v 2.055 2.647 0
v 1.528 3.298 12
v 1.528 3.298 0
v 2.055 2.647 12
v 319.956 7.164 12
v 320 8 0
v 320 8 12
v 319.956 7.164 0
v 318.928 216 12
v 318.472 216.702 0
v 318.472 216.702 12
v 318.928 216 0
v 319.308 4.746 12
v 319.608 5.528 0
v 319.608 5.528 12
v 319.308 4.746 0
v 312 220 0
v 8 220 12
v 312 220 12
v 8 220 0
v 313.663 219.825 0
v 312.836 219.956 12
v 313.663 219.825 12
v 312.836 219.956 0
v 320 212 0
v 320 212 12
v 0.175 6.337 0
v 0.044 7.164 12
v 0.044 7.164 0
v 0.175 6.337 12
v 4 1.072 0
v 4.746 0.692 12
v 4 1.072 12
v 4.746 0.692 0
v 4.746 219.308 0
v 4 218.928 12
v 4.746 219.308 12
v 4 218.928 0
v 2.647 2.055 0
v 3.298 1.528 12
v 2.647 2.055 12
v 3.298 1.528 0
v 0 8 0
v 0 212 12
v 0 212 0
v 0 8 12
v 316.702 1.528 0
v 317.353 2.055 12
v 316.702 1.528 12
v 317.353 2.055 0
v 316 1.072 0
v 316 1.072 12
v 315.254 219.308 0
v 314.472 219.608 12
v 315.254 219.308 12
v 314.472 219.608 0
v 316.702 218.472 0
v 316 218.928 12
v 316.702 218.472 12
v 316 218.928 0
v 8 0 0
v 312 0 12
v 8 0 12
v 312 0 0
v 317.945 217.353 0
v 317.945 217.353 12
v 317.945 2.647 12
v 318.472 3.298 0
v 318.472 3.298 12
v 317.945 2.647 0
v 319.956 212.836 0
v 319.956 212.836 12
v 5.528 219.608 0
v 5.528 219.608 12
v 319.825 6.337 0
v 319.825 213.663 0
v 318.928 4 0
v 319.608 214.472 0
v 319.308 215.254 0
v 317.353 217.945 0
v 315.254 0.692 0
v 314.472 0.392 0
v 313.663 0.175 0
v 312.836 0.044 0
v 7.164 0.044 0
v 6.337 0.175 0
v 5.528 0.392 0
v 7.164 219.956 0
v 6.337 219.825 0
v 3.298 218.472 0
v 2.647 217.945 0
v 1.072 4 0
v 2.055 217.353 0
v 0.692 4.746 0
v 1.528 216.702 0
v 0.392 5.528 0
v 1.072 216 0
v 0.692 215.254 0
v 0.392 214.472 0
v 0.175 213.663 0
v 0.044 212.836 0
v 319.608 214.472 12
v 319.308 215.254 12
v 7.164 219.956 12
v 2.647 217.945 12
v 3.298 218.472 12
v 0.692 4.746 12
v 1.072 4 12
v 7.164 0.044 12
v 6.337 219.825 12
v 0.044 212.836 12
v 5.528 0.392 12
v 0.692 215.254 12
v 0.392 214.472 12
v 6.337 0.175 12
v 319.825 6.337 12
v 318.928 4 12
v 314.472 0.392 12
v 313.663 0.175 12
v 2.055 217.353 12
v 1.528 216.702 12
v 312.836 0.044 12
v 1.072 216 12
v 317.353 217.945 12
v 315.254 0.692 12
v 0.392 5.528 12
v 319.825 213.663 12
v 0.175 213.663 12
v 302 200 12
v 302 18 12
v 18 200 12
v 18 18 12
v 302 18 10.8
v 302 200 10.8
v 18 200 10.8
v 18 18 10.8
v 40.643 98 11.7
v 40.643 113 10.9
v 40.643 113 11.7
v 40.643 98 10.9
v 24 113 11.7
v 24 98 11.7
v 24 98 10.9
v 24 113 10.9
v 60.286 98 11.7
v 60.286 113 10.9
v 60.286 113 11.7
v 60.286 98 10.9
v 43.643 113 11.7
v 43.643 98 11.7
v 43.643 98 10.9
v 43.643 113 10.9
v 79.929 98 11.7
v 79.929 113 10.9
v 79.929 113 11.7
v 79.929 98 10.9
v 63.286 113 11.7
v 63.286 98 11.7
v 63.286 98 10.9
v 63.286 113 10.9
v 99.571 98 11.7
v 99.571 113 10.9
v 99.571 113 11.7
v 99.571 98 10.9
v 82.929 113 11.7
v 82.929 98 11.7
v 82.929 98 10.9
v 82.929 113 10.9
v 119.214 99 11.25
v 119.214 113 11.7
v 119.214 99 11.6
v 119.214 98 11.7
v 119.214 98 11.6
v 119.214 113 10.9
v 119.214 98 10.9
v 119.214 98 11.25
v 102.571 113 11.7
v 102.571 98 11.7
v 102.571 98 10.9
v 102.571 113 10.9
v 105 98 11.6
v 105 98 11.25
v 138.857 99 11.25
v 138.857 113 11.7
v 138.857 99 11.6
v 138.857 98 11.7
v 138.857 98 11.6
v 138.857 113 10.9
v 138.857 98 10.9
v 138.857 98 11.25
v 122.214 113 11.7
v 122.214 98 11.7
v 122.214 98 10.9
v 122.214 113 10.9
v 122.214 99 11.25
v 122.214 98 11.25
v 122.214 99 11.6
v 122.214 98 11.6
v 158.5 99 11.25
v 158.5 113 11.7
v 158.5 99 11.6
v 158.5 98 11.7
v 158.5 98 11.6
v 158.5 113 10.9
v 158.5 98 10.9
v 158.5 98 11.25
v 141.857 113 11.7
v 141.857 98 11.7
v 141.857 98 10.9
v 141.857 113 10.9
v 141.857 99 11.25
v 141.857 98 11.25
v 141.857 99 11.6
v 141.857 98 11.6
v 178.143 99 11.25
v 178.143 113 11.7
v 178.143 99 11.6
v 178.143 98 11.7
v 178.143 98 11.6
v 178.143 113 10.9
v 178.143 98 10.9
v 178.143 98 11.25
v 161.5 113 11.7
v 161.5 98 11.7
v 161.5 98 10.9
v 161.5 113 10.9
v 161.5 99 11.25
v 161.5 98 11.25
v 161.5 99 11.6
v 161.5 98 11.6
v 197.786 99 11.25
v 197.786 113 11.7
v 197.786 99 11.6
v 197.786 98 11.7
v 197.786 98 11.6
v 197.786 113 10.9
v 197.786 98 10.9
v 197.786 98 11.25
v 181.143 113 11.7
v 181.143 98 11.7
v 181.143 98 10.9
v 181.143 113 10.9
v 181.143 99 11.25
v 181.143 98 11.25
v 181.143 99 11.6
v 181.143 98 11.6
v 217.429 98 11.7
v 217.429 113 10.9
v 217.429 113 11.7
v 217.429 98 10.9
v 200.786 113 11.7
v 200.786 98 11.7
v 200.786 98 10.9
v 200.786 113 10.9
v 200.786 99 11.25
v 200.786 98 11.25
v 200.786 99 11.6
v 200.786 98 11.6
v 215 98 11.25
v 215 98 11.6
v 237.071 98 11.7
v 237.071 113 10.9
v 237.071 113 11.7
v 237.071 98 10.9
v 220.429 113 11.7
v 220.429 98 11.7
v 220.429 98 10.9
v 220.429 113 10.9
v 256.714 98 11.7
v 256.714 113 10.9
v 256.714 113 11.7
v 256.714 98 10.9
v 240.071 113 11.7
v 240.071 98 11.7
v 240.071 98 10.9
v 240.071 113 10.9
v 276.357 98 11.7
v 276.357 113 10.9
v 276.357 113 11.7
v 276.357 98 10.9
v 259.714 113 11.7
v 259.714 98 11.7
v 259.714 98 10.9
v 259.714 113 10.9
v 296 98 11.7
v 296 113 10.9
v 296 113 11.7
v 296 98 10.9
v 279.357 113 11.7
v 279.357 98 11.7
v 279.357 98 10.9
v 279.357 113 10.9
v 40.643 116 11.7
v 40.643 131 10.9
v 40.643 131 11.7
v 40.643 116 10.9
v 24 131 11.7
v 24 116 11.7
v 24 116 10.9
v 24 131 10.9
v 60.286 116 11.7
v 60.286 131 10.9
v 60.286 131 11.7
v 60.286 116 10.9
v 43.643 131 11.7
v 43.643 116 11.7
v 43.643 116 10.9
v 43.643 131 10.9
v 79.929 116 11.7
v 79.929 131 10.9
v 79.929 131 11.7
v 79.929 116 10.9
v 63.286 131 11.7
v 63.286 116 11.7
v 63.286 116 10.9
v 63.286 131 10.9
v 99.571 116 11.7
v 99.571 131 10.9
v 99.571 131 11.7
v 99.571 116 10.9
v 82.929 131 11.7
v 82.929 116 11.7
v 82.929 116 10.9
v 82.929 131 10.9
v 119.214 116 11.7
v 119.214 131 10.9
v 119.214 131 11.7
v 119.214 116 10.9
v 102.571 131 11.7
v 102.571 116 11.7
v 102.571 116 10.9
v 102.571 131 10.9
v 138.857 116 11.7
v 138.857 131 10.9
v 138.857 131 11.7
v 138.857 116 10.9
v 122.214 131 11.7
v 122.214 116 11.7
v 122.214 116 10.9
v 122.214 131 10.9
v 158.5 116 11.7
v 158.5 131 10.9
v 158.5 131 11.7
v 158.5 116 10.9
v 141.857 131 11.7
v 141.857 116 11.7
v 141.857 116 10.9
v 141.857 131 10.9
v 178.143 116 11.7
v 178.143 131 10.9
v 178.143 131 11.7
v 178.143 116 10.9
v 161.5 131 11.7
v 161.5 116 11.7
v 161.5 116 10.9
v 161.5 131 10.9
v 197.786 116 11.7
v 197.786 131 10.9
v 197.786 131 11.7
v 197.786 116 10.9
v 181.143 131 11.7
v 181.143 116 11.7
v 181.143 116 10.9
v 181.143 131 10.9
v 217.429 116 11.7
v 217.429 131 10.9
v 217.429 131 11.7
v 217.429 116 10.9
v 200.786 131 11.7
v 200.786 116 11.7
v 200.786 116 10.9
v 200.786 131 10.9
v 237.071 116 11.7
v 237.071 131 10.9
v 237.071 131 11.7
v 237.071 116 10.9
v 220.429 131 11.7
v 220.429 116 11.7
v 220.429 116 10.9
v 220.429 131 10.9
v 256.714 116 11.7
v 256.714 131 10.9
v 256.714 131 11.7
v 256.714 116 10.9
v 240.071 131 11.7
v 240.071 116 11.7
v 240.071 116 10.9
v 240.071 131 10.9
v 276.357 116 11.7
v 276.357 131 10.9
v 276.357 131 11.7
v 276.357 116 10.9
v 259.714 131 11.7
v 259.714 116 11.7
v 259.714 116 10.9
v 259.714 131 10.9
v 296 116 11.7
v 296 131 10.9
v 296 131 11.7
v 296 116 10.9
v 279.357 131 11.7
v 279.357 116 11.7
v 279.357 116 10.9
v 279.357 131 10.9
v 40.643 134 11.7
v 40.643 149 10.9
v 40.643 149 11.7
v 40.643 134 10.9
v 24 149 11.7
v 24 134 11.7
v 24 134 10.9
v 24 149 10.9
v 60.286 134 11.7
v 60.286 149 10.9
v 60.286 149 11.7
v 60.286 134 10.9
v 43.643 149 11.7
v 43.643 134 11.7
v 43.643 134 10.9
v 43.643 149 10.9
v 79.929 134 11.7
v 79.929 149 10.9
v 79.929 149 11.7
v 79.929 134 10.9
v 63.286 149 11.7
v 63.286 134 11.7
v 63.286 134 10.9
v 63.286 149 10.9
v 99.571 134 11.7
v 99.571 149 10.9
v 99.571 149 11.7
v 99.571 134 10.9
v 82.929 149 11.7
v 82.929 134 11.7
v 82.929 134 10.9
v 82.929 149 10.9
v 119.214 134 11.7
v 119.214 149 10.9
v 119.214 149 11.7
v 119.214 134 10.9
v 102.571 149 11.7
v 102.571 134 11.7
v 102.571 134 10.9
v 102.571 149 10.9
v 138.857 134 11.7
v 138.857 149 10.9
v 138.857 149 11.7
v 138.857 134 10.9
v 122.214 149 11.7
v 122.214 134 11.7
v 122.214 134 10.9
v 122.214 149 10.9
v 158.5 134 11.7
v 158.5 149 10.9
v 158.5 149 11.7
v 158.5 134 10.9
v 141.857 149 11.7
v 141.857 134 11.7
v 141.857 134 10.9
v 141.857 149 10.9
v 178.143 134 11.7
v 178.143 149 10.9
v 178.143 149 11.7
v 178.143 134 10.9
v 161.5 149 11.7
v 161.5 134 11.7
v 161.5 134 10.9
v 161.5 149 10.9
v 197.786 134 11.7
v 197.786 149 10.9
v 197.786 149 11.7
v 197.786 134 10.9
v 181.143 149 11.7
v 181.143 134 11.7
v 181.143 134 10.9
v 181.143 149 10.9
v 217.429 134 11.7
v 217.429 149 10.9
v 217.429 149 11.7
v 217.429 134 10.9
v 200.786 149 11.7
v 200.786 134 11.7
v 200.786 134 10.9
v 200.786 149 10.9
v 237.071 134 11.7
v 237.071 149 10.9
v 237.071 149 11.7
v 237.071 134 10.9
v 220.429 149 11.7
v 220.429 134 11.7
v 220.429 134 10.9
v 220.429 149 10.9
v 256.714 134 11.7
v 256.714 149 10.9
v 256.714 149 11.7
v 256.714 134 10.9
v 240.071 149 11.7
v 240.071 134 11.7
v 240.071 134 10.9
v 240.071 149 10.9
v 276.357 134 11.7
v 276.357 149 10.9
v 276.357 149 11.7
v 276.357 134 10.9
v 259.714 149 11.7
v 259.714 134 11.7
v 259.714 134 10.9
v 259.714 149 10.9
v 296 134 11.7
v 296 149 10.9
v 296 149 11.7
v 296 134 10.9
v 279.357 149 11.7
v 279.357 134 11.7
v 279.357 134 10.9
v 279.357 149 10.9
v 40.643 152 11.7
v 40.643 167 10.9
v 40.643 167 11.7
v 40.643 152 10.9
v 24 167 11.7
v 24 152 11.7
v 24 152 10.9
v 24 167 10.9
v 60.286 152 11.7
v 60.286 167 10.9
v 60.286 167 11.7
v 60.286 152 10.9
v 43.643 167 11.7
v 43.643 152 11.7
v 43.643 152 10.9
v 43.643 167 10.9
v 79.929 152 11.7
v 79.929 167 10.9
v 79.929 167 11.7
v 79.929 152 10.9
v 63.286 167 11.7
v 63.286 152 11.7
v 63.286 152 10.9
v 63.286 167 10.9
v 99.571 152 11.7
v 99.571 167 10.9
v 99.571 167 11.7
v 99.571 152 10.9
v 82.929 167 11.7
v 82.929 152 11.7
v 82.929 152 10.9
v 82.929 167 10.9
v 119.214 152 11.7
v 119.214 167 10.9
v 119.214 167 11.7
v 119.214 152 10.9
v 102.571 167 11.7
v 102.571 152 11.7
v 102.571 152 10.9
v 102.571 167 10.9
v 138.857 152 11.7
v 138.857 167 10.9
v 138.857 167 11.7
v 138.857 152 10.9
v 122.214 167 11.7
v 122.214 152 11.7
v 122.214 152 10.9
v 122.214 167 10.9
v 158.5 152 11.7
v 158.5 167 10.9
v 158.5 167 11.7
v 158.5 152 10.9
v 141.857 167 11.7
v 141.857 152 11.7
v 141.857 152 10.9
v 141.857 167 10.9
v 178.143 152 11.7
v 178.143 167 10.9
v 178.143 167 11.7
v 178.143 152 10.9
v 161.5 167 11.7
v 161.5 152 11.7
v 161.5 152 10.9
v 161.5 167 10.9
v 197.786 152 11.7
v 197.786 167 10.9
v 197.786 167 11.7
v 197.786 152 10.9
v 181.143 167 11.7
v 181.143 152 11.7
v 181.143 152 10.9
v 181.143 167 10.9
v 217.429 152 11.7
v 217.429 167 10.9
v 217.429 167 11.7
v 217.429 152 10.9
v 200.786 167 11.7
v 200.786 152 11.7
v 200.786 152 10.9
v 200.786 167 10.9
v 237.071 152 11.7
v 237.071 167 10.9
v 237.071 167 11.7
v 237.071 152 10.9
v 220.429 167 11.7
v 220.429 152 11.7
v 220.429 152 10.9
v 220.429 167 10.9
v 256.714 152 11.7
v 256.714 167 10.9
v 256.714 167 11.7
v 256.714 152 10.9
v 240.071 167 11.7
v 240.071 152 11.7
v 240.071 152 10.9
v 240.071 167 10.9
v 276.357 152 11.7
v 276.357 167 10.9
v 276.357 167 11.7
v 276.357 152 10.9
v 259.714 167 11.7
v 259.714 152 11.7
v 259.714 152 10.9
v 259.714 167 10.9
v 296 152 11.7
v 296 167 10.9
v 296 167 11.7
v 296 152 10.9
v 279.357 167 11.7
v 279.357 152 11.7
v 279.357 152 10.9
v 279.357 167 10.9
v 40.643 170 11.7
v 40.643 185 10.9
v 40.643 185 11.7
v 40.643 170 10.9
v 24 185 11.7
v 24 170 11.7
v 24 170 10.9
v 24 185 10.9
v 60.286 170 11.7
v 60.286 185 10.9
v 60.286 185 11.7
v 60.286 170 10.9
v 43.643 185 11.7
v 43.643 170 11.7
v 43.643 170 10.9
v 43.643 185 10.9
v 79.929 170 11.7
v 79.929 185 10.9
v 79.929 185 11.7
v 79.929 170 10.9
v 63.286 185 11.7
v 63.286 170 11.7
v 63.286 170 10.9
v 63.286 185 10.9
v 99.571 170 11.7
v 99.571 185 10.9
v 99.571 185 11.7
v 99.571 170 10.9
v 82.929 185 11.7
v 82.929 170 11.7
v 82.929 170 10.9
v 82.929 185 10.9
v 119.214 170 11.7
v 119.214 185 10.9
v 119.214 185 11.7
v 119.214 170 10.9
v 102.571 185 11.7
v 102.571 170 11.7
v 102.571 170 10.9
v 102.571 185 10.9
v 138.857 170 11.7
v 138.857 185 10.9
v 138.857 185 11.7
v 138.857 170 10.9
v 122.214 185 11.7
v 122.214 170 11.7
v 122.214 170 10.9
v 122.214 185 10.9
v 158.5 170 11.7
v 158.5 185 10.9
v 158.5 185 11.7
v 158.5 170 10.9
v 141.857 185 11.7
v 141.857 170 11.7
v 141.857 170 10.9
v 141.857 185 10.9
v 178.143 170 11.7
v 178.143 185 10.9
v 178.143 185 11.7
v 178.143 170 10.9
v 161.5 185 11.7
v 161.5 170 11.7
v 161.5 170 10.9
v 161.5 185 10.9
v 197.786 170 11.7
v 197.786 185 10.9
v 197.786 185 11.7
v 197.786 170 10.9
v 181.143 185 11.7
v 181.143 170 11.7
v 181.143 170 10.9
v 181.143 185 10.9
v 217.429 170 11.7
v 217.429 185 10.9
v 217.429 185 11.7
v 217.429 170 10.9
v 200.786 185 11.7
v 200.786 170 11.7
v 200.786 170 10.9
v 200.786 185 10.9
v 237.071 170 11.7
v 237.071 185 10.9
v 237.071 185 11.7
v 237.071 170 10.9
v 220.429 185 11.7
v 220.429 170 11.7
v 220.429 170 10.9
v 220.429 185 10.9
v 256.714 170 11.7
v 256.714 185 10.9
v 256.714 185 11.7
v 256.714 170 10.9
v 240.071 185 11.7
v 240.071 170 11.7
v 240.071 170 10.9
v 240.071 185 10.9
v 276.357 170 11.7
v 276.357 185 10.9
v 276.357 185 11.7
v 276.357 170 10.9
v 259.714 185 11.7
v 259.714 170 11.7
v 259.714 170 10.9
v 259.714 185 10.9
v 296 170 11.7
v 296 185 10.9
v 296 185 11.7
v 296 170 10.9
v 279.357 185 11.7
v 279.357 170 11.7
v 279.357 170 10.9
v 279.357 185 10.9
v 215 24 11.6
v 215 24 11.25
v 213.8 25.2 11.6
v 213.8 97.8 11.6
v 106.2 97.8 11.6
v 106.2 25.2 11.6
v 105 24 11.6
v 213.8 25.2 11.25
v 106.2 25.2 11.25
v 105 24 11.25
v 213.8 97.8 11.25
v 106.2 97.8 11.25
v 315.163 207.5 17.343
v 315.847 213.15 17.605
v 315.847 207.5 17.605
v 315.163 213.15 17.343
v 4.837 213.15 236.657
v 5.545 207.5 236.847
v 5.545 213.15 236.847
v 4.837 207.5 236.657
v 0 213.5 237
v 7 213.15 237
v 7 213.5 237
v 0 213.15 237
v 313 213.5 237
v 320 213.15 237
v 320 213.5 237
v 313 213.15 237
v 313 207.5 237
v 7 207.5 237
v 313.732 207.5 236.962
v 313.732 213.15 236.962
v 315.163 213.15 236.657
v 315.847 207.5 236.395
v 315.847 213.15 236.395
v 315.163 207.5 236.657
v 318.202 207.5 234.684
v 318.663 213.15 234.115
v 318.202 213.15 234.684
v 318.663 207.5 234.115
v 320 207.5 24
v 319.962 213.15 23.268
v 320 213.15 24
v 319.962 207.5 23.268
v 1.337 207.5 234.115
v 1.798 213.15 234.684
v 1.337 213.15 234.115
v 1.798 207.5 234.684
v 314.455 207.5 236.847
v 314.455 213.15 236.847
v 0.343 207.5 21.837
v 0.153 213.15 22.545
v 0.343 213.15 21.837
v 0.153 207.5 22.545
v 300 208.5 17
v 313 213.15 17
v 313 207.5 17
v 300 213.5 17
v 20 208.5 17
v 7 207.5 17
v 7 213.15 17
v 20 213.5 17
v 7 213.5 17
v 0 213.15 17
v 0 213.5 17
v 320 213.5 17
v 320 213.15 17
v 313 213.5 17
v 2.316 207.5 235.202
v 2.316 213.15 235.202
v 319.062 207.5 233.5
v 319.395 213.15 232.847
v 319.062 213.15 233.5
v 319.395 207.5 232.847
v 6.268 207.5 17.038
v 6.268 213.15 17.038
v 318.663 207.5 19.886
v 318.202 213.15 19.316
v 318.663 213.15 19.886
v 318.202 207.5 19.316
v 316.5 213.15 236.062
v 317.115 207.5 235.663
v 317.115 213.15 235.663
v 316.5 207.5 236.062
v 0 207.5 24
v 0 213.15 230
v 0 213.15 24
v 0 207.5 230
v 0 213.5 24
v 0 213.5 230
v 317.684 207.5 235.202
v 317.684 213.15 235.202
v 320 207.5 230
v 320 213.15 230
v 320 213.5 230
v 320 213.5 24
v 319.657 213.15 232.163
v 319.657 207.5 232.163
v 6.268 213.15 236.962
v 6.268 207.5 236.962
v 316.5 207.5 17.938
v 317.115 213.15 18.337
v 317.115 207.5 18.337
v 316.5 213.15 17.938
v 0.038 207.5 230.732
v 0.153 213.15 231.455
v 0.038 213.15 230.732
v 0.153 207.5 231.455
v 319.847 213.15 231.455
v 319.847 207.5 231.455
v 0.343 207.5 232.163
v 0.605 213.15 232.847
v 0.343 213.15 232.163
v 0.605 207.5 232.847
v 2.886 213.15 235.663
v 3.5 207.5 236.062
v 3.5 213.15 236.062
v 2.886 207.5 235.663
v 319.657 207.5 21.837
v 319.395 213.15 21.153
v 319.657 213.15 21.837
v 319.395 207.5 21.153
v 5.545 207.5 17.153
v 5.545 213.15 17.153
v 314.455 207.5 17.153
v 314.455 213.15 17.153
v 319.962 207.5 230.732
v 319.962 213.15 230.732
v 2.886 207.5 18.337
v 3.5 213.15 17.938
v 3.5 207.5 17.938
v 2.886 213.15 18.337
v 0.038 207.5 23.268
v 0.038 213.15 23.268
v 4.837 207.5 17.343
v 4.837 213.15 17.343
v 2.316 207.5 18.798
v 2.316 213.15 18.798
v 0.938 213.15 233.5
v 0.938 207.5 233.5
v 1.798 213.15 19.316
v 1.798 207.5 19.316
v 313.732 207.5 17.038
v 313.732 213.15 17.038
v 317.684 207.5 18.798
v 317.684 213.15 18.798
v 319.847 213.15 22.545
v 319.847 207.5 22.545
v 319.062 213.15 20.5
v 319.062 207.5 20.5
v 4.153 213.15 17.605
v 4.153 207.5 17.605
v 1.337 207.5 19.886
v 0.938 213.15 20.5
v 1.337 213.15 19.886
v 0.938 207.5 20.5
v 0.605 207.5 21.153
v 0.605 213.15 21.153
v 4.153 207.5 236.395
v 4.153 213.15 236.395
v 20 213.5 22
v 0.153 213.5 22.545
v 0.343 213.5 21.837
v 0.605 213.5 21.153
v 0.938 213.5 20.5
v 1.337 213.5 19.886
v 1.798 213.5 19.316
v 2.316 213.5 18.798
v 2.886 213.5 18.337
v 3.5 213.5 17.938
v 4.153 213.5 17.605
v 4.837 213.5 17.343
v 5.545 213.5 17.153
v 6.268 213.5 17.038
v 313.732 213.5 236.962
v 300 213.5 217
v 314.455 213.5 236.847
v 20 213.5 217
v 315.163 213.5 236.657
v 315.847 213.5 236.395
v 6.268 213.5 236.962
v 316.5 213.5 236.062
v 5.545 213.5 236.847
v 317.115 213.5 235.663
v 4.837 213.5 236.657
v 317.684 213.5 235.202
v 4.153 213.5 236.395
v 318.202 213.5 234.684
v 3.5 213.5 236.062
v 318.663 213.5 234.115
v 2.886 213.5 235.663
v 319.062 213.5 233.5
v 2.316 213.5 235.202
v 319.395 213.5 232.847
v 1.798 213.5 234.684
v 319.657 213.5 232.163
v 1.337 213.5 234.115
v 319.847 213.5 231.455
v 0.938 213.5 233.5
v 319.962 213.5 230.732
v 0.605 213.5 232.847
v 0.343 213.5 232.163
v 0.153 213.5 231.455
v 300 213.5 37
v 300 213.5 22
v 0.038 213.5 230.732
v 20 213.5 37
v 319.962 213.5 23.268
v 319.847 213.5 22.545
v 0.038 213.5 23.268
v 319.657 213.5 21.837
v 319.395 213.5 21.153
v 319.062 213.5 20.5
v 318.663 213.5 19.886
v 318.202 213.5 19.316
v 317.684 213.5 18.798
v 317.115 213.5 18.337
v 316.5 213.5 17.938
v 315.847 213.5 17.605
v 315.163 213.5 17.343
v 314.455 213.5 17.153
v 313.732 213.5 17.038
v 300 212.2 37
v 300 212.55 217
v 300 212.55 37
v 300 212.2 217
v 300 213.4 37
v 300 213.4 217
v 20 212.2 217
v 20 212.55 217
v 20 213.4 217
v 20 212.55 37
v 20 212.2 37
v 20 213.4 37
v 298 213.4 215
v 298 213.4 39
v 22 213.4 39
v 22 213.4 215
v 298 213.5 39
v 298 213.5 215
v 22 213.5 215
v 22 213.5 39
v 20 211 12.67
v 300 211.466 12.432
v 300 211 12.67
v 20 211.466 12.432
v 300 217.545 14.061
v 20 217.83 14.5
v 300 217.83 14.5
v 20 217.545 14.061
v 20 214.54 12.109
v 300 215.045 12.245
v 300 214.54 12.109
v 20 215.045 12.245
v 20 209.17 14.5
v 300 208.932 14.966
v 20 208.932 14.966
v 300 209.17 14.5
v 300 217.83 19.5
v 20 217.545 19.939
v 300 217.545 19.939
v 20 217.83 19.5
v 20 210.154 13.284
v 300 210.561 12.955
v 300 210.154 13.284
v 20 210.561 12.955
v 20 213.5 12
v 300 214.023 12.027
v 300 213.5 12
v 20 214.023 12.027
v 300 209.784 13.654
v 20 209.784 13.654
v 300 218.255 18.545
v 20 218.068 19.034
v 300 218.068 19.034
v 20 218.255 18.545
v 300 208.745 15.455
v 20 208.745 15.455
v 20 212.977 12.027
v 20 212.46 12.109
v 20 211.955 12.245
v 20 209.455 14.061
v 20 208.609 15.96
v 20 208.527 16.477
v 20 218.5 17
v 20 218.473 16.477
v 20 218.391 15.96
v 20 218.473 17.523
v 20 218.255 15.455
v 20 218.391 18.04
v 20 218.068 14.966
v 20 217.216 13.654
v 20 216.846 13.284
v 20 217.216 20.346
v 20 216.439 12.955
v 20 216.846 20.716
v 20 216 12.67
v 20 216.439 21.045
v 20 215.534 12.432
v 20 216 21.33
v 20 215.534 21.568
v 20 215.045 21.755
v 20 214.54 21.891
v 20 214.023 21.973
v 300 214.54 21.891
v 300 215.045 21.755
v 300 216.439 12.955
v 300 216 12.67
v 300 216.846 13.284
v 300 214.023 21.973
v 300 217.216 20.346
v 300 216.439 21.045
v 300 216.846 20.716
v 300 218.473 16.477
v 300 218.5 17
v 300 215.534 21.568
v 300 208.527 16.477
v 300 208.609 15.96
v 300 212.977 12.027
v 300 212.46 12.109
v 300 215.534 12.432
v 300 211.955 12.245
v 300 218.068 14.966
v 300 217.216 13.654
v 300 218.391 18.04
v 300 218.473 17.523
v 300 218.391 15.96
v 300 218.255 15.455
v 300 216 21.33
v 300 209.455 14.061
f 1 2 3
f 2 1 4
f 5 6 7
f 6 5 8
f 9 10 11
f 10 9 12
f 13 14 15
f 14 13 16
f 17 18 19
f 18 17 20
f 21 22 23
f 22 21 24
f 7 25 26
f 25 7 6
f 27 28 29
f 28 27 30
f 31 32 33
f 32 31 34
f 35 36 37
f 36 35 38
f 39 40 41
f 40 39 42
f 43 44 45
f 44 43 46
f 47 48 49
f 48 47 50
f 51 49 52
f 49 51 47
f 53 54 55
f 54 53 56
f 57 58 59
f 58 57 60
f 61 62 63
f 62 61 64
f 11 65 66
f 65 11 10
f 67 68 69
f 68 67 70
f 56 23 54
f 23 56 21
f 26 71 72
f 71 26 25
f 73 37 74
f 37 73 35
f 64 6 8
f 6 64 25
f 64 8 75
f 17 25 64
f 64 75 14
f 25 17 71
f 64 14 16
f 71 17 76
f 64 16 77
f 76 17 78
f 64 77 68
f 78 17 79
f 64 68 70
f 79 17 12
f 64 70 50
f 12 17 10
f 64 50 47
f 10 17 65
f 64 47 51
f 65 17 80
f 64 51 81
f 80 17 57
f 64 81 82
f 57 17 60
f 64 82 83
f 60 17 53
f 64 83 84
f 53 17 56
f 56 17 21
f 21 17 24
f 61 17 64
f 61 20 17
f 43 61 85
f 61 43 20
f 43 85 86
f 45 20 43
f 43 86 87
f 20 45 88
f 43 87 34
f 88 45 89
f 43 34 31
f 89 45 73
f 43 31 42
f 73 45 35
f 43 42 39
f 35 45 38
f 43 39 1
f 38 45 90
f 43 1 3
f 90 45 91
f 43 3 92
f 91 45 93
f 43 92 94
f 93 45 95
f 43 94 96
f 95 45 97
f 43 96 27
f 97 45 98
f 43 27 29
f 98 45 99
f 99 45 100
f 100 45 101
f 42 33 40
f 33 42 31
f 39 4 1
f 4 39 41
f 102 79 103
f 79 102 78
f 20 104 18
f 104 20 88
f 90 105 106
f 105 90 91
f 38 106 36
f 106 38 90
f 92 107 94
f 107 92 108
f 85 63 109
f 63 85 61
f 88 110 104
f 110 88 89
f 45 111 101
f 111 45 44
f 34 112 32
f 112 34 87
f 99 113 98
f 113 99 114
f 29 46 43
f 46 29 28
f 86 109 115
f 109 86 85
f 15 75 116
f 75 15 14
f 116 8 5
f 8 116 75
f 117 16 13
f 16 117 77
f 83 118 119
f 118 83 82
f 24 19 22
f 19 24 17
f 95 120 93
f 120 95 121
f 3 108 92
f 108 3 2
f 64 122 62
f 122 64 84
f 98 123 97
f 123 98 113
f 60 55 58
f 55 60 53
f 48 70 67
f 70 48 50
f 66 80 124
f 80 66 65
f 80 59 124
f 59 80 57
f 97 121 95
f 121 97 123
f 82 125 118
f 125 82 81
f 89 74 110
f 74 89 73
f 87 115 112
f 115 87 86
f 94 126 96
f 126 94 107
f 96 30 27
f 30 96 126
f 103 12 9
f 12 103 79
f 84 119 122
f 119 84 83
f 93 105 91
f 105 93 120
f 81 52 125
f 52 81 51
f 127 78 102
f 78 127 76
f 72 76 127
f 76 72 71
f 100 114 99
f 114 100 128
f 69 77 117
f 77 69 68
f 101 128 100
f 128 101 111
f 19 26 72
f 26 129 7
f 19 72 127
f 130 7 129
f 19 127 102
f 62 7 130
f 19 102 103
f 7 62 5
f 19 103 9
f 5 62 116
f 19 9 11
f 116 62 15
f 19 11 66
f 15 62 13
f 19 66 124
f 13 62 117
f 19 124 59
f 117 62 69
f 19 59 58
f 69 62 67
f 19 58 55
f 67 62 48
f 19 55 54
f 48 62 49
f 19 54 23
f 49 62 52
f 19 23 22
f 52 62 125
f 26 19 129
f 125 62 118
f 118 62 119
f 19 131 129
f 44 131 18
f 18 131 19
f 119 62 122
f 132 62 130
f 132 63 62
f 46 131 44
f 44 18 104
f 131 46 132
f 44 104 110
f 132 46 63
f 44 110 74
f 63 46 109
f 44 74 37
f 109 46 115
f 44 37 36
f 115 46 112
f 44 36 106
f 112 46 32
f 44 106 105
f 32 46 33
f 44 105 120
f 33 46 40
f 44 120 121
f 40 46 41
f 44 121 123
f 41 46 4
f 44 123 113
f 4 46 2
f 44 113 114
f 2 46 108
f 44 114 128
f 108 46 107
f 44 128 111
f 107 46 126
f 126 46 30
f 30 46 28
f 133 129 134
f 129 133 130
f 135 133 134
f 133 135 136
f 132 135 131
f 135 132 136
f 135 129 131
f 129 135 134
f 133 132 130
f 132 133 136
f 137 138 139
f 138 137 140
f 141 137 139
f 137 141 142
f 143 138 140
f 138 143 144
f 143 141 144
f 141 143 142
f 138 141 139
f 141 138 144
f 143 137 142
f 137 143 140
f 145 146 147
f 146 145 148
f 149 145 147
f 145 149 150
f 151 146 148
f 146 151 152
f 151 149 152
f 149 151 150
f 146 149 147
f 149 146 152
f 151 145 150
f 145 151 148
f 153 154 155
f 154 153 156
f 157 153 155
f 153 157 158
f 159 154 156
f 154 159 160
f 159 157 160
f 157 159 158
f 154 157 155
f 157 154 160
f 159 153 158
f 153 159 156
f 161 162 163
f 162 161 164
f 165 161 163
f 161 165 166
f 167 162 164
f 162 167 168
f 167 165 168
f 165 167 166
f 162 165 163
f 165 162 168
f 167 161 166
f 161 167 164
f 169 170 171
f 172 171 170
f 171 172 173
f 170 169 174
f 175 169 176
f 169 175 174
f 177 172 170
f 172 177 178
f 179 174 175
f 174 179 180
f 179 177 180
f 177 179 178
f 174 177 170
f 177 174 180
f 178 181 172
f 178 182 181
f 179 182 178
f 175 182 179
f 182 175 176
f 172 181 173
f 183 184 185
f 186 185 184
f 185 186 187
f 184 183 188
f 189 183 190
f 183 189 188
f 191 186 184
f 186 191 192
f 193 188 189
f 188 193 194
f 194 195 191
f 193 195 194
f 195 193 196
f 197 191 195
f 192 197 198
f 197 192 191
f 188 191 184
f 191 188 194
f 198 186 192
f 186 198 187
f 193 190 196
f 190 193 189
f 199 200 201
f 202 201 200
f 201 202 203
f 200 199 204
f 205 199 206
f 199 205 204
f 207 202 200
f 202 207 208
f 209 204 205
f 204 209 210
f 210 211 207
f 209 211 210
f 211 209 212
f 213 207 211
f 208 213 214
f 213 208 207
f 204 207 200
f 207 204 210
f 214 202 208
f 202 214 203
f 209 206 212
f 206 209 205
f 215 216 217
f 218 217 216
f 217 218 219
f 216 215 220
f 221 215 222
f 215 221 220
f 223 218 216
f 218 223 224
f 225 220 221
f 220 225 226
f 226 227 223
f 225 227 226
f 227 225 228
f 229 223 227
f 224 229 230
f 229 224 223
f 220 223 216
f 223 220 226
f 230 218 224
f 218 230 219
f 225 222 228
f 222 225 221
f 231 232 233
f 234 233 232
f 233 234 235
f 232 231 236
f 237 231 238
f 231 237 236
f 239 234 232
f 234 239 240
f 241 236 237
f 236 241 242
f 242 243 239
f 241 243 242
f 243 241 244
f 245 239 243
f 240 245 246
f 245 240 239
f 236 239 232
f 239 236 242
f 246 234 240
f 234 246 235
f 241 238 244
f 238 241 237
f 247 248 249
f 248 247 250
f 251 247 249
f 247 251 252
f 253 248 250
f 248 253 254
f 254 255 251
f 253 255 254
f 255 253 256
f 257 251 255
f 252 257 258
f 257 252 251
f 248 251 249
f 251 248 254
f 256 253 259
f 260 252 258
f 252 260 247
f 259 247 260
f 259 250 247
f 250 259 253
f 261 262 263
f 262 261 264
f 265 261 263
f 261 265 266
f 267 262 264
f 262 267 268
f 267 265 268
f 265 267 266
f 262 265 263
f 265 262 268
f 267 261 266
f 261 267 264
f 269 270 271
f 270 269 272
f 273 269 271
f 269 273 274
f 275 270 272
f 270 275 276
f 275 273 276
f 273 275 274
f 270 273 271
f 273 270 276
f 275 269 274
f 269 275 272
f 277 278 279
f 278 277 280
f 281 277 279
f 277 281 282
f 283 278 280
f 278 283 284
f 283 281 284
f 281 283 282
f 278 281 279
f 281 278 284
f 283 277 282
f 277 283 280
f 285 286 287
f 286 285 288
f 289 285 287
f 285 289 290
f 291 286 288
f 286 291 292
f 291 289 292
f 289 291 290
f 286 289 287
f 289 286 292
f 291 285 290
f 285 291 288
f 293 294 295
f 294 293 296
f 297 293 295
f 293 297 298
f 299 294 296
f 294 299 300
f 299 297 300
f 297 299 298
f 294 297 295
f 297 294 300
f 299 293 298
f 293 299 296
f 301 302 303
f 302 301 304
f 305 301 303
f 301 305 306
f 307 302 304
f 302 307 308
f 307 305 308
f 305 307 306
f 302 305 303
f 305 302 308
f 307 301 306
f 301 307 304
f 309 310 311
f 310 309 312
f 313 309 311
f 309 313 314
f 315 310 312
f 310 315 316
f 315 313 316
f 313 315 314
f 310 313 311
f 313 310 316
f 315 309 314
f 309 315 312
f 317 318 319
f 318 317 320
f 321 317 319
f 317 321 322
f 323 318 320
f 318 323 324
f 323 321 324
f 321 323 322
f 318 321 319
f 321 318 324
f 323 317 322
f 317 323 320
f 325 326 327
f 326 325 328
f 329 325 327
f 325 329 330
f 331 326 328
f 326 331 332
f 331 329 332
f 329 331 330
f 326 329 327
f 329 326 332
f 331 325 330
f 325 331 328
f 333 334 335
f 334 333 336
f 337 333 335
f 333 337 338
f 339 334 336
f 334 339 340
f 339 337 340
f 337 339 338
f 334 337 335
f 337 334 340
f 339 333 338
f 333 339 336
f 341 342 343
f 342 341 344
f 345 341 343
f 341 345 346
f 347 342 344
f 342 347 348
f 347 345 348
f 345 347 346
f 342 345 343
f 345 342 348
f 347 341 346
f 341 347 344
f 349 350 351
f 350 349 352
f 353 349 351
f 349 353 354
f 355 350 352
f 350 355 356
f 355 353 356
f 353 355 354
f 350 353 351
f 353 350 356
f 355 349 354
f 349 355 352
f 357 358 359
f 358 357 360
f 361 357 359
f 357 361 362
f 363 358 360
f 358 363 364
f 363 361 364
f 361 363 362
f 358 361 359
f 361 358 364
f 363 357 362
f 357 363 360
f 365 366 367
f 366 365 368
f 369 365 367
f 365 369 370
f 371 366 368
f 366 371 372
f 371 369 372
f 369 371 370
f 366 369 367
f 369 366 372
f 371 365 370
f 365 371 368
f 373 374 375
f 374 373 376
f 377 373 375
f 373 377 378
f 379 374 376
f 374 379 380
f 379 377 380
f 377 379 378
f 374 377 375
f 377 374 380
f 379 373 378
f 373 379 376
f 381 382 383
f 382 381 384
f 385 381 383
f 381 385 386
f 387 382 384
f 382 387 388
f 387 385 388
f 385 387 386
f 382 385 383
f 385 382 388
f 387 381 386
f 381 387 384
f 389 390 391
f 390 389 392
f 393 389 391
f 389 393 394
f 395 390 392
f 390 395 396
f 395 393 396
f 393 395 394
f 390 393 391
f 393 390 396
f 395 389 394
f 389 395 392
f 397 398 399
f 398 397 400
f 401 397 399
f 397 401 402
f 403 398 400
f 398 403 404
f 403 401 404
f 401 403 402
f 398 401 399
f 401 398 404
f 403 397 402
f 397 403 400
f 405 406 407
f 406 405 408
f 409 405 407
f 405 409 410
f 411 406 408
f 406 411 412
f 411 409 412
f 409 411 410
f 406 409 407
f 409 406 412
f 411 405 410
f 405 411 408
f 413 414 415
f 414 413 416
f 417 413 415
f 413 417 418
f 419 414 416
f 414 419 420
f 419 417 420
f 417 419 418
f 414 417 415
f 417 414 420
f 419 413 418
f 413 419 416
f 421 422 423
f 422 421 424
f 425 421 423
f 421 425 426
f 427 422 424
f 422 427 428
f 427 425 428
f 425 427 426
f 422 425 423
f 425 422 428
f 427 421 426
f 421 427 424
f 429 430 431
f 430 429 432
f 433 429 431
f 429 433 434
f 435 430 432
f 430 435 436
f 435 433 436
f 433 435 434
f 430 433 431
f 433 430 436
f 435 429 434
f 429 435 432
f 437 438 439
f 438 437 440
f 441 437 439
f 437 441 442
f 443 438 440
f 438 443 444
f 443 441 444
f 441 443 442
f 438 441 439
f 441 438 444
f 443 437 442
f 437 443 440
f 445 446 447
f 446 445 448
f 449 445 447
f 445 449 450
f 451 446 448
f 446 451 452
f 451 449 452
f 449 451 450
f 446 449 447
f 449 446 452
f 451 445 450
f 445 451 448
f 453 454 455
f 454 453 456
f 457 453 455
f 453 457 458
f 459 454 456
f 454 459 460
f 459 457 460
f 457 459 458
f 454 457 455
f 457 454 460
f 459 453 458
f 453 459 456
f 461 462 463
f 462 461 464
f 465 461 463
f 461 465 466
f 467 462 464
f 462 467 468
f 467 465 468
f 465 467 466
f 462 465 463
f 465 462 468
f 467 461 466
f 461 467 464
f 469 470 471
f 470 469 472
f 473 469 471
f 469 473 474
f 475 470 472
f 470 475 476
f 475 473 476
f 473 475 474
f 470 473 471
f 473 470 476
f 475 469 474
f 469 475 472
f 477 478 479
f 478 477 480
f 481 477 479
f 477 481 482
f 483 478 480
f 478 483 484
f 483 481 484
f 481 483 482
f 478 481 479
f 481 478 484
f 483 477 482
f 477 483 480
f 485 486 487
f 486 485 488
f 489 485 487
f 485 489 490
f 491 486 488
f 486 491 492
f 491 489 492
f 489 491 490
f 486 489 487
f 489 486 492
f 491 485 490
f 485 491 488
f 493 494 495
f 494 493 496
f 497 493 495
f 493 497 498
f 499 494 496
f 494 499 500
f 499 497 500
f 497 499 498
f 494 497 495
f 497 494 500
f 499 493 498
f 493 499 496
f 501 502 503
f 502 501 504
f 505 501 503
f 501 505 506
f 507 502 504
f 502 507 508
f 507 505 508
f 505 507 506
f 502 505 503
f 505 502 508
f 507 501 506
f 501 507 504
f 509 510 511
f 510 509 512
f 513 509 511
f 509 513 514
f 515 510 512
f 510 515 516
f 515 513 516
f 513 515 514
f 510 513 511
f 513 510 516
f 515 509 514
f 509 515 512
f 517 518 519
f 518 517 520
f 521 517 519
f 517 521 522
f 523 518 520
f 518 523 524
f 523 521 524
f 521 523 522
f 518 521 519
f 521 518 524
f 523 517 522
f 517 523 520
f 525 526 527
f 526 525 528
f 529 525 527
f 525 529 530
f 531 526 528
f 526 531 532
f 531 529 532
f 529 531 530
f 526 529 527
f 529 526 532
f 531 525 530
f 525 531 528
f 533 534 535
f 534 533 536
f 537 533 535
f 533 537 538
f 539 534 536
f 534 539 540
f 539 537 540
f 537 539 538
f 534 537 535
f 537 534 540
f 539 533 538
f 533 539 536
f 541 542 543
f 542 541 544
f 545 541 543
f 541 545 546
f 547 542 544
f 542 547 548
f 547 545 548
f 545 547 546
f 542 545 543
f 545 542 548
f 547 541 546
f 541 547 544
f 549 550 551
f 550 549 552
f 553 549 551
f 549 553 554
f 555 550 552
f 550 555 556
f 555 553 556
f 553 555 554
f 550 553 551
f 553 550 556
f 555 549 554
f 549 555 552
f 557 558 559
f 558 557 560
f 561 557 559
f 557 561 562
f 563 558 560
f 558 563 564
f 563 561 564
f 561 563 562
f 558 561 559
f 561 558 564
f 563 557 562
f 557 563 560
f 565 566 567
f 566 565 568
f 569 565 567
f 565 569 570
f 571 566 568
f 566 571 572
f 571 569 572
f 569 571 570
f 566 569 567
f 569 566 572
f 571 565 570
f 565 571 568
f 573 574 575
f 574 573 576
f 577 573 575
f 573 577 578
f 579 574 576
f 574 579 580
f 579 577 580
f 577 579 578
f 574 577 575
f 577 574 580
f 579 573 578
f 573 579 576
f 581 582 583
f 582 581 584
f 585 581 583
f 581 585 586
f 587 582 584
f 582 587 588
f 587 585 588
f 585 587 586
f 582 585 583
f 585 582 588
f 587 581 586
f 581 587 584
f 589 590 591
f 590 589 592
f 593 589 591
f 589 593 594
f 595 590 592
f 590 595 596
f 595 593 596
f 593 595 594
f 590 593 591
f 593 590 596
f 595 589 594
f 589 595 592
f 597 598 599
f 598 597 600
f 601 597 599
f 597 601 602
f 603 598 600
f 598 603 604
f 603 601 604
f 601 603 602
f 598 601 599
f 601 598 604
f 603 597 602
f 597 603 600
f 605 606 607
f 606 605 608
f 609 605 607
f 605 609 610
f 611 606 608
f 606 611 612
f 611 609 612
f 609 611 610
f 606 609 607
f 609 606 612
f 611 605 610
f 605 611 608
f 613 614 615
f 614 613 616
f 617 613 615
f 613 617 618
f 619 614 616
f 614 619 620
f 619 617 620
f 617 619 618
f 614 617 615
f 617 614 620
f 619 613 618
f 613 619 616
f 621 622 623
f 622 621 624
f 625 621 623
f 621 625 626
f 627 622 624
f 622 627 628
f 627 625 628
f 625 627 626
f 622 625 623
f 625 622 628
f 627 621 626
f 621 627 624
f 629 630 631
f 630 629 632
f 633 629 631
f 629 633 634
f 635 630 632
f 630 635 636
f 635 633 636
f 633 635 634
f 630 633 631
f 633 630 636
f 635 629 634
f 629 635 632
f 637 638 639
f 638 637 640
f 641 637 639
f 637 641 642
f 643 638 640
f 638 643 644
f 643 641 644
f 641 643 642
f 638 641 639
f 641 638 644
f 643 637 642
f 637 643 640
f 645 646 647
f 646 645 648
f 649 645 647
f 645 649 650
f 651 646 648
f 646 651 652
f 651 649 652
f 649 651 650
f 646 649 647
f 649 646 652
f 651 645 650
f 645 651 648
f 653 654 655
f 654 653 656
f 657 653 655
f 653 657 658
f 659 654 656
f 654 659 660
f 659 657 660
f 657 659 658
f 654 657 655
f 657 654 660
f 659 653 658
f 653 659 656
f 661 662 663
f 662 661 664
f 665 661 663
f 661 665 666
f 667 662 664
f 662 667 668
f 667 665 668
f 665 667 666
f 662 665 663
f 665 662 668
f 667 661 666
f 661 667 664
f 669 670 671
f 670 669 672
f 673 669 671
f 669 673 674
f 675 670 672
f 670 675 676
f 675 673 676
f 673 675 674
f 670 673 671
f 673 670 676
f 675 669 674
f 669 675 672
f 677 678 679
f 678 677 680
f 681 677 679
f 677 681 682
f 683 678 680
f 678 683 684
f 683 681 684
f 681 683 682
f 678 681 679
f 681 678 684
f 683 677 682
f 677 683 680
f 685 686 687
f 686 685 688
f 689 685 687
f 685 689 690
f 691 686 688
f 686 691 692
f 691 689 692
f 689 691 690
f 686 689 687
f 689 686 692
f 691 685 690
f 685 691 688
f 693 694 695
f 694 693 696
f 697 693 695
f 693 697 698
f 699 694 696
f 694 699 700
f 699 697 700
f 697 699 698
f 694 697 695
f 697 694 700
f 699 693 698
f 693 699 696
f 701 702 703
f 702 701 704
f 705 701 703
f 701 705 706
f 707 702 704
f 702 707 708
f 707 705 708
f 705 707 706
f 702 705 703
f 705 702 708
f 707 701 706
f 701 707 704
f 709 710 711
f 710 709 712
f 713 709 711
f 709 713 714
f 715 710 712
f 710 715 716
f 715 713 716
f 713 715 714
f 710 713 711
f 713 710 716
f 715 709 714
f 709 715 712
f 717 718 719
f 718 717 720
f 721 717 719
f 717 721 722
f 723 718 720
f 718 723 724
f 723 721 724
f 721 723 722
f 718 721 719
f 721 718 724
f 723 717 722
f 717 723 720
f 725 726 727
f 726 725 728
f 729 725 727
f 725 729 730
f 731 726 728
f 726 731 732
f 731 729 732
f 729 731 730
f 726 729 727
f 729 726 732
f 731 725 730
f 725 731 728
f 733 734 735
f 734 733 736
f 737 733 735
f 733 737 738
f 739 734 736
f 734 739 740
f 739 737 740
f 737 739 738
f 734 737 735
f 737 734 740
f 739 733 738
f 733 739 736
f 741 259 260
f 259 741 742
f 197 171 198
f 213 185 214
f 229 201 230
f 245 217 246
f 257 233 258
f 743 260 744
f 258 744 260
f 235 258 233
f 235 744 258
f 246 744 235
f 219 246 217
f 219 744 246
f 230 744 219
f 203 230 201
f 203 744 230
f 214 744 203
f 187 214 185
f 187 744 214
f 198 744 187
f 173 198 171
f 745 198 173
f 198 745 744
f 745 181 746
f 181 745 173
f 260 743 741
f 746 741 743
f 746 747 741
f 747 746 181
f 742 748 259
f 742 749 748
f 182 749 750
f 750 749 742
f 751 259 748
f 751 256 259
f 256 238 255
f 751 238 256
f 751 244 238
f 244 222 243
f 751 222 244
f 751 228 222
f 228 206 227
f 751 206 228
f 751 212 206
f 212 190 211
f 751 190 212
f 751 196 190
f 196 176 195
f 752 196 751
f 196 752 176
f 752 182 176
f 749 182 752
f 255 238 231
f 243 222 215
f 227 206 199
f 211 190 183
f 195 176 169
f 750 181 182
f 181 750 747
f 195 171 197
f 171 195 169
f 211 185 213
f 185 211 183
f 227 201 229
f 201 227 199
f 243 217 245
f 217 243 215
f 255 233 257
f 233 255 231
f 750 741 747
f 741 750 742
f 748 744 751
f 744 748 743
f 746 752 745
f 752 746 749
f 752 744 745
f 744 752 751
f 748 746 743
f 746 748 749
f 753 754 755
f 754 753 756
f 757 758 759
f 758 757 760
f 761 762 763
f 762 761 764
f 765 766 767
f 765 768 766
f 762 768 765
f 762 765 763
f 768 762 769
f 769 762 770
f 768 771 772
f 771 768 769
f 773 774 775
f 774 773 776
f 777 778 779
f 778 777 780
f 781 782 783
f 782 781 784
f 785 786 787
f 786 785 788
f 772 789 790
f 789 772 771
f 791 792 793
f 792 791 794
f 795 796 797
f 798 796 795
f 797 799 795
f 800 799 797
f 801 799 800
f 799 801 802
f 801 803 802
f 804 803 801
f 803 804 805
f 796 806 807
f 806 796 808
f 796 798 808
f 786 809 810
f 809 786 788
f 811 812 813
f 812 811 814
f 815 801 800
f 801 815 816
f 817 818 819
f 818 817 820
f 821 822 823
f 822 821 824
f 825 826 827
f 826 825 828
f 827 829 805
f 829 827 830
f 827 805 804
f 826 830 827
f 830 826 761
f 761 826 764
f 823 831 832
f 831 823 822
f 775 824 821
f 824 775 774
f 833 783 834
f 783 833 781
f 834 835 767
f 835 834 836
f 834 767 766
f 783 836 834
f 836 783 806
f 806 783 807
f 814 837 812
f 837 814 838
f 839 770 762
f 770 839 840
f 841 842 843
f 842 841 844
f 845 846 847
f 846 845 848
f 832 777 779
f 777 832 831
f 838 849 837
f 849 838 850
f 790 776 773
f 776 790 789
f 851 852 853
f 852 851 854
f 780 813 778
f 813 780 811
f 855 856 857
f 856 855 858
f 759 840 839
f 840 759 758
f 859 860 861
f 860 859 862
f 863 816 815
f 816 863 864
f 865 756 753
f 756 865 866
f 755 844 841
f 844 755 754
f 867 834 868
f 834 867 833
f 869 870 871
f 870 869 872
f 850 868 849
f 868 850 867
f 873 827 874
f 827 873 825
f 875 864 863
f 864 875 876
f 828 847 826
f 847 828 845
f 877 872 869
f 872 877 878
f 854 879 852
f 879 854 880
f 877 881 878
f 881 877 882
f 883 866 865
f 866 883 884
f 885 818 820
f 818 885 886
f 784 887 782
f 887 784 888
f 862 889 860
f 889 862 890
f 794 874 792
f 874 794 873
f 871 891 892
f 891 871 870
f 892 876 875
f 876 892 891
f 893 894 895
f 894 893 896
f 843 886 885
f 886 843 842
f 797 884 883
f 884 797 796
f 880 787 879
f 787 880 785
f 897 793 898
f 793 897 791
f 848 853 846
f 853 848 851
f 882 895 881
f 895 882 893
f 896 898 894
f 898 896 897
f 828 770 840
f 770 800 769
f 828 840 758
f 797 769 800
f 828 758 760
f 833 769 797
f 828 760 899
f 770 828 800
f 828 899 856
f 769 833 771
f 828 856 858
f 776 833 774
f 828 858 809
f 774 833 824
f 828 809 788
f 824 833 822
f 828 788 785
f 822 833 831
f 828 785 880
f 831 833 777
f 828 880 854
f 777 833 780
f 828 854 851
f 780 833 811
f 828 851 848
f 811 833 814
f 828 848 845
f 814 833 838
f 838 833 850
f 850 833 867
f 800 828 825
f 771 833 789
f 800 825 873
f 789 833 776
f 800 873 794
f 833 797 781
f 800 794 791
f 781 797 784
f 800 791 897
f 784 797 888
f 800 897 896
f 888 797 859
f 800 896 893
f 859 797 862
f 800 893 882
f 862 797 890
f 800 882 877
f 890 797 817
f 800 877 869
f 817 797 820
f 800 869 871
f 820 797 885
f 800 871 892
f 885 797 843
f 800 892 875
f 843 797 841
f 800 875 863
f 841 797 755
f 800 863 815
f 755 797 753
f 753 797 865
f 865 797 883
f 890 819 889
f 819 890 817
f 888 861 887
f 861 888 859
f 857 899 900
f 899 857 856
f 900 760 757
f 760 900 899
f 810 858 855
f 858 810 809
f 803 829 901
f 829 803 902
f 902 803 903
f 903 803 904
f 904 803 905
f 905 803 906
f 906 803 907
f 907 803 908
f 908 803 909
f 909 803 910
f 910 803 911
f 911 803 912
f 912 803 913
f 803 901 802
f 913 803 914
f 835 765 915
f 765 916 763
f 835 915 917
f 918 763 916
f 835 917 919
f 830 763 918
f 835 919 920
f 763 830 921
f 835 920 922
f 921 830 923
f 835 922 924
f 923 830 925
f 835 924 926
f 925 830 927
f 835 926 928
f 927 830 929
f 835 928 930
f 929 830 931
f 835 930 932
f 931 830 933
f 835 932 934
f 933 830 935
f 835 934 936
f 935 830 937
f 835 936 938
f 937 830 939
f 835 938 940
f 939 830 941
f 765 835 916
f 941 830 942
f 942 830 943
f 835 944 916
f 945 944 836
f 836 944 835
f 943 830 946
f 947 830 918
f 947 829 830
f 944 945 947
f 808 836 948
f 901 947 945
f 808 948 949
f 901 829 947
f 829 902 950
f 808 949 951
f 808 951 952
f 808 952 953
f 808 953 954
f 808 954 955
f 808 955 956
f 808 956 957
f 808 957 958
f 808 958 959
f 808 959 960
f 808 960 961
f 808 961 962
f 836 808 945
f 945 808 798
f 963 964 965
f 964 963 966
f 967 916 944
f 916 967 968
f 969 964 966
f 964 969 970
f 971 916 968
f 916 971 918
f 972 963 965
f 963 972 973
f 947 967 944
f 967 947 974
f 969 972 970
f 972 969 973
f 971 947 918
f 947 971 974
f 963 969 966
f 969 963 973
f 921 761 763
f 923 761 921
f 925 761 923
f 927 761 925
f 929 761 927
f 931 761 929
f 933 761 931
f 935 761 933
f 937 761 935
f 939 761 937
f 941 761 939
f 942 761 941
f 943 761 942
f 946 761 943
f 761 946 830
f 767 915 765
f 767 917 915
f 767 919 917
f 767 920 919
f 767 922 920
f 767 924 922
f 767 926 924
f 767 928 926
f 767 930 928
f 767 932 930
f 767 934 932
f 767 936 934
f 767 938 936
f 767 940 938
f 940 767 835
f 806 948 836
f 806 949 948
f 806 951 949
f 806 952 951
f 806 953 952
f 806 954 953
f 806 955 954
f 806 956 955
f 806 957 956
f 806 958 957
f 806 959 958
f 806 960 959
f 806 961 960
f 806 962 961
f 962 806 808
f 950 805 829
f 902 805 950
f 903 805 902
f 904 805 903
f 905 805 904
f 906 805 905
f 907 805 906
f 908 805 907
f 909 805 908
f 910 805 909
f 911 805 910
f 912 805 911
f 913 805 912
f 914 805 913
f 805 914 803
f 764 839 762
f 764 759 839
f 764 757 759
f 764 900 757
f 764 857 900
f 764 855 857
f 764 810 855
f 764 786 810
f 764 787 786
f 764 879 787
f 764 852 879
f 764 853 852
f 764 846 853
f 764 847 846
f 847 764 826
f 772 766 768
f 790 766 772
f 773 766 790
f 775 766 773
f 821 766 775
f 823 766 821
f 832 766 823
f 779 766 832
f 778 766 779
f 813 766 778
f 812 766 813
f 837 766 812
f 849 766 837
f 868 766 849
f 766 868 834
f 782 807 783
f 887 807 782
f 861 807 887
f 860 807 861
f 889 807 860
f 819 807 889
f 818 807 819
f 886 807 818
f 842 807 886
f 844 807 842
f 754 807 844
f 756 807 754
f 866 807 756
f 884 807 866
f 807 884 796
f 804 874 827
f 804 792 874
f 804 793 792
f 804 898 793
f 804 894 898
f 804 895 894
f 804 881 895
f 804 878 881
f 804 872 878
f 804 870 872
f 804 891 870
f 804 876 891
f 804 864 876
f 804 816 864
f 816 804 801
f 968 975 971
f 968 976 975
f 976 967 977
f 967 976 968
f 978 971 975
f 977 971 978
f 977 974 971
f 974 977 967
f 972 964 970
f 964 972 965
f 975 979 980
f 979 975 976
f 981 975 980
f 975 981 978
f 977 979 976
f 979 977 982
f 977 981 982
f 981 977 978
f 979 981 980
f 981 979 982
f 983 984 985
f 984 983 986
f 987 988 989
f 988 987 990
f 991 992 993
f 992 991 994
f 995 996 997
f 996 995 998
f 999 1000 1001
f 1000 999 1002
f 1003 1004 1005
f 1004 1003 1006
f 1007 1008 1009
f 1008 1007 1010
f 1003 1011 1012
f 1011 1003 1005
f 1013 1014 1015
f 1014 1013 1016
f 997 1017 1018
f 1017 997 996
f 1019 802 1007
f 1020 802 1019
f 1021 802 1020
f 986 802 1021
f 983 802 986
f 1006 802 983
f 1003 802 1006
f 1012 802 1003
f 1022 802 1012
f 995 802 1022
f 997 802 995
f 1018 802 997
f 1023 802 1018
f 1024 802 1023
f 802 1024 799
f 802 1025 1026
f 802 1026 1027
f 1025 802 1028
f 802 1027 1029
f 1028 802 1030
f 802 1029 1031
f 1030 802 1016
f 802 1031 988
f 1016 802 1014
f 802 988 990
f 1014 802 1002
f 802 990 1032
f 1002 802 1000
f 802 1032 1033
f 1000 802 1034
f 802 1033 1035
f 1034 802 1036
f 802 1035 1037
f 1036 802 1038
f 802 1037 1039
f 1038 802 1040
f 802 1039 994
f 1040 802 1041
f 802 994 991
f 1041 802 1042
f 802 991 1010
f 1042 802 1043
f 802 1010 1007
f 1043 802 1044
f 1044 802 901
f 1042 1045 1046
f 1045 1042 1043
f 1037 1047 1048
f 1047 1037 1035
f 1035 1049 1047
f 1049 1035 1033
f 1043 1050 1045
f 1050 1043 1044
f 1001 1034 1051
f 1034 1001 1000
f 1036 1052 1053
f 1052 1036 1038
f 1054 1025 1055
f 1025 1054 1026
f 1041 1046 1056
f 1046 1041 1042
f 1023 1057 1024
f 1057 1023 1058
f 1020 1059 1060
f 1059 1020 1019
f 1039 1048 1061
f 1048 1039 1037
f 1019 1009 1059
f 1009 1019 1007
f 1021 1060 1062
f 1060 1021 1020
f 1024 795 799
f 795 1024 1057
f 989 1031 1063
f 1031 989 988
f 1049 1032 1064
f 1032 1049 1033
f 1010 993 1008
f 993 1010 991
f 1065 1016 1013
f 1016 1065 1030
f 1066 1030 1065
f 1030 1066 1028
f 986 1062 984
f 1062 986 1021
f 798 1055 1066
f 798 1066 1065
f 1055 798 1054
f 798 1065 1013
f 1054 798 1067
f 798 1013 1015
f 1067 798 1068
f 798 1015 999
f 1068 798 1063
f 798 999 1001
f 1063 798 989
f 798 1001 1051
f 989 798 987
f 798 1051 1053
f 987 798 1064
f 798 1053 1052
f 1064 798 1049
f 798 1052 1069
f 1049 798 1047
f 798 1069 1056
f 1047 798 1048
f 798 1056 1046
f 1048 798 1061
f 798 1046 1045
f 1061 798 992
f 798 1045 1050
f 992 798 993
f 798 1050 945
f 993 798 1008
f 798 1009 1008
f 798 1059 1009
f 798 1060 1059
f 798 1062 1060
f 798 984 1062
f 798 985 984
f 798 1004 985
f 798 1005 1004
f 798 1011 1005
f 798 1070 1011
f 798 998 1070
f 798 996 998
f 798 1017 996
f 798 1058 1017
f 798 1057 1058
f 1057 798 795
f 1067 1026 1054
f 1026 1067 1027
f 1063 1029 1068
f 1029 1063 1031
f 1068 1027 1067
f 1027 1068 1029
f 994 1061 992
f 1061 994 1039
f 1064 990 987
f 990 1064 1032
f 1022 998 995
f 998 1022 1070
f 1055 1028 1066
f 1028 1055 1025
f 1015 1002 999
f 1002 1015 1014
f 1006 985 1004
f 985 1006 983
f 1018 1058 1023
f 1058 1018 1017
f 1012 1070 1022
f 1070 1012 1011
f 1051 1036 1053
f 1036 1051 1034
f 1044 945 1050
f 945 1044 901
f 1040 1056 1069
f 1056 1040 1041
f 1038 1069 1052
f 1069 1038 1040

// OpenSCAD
/*
Simple laptop model (open position)
Specifications (mm):
- Overall footprint (base): 320 x 220
- Base thickness: 12
- Screen panel size: 320 x 220 x 6
- Open angle: 110 degrees (between keyboard deck and screen)
- Includes simple keyboard area, trackpad, hinge bar, and display bezel

3D printing tips:
- Print base and screen separately if you want stronger hinge detail.
- Increase wall_thickness for a chunkier toy-like model.
- Use lower $fn (36-48) for faster preview; keep 60 for nicer rounded hinge.
*/

// Parameters
$fn = 60;           // Circular resolution
num_steps = 50;     // Loft interpolation steps (reserved for project convention)
wall_thickness = 2; // Wall thickness (mm)

// Overall dimensions (mm)
laptop_width = 320;       // X direction
laptop_depth = 220;       // Y direction
base_thickness = 12;      // Z thickness of bottom body
screen_thickness = 6;     // Z thickness of screen body
open_angle_deg = 90;      // Angle between base top plane and screen panel

// Detail dimensions (mm)
corner_radius = 8;        // Rounded corner radius for base/screen
screen_bezel = 20;        // Front bezel width (mm)
screen_inset_depth = 1.2; // Screen glass recess depth
keyboard_margin_x = 18;
keyboard_margin_y_front = 18;
keyboard_margin_y_back = 20;
keyboard_recess = 1.2;
trackpad_w = 110;
trackpad_h = 75;
trackpad_recess = 0.8;
trackpad_offset_from_front = 24;
hinge_radius = 5;
hinge_length = laptop_width - 40;
hinge_gap = 1.2;          // Visual gap between base and screen near hinge

// Derived values
screen_tilt_back_deg = open_angle_deg - 90; // 90deg = vertical screen, >90 tilts backward
screen_frame_w = laptop_width;
screen_frame_h = laptop_depth;
screen_body_x = laptop_width;
screen_body_y = screen_thickness;
screen_body_z = laptop_depth;

base_center_z = base_thickness / 2;
base_top_z = base_thickness;

screen_pivot_x = laptop_width / 2;
hinge_center_y = laptop_depth - hinge_radius - 1.5;
hinge_center_z = base_thickness + hinge_radius;
screen_pivot_y = hinge_center_y + hinge_gap;
screen_pivot_z = hinge_center_z;

screen_center_local = [screen_body_x / 2, screen_body_y / 2, screen_body_z / 2];

keyboard_area_w = laptop_width - 2 * keyboard_margin_x;
keyboard_area_d = laptop_depth - keyboard_margin_y_front - keyboard_margin_y_back;

trackpad_x = laptop_width / 2 - trackpad_w / 2;
trackpad_y = trackpad_offset_from_front;

display_open_w = screen_frame_w - 2 * screen_bezel;
display_open_h = screen_frame_h - 2 * screen_bezel;

// Modules
module rounded_rect_plate(size = [10, 10, 2], r = 2) {
    sx = size[0];
    sy = size[1];
    sz = size[2];

    hull() {
        for (x = [-sx / 2 + r, sx / 2 - r])
            for (y = [-sy / 2 + r, sy / 2 - r])
                translate([x, y, 0])
                    cylinder(r = r, h = sz);
    }
}

module laptop_base() {
    color([0.72, 0.74, 0.78])
    difference() {
        translate([laptop_width / 2, laptop_depth / 2, 0])
            rounded_rect_plate([laptop_width, laptop_depth, base_thickness], corner_radius);

        // Keyboard deck recess
        translate([keyboard_margin_x, keyboard_margin_y_front, base_thickness - keyboard_recess])
            cube([keyboard_area_w, keyboard_area_d, keyboard_recess + 0.2]);

        // Trackpad recess
        translate([trackpad_x, trackpad_y, base_thickness - trackpad_recess])
            cube([trackpad_w, trackpad_h, trackpad_recess + 0.2]);
    }
}

module keyboard_grid() {
    key_cols = 14;
    key_rows = 5;
    key_gap = 3;
    key_h = 0.8;
    area_x = keyboard_margin_x + 6;
    area_y = keyboard_margin_y_front + 80;
    area_w = keyboard_area_w - 12;
    area_d = keyboard_area_d - 95;
    key_w = (area_w - (key_cols - 1) * key_gap) / key_cols;
    key_d = (area_d - (key_rows - 1) * key_gap) / key_rows;

    color([0.16, 0.17, 0.19])
    for (r = [0 : key_rows - 1]) {
        for (c = [0 : key_cols - 1]) {
            translate([
                area_x + c * (key_w + key_gap),
                area_y + r * (key_d + key_gap),
                base_thickness - keyboard_recess + 0.1
            ])
                cube([key_w, key_d, key_h]);
        }
    }
}

module trackpad_outline() {
    color([0.55, 0.57, 0.61])
    translate([trackpad_x, trackpad_y, base_thickness - trackpad_recess + 0.05])
        difference() {
            cube([trackpad_w, trackpad_h, 0.35]);
            translate([1.2, 1.2, -0.05])
                cube([trackpad_w - 2.4, trackpad_h - 2.4, 0.5]);
        }
}

module hinge_bar() {
    color([0.30, 0.31, 0.34])
    translate([laptop_width / 2, hinge_center_y, hinge_center_z])
        rotate([0, 90, 0])
            cylinder(r = hinge_radius, h = hinge_length, center = true);
}

module screen_panel() {
    color([0.68, 0.70, 0.74])
    difference() {
        // Screen body (local coordinates: X 0..width, Y -thickness..0, Z 0..height)
        translate([screen_frame_w / 2, 0, screen_frame_h / 2])
            rotate([90, 0, 0])
                rounded_rect_plate([screen_frame_w, screen_frame_h, screen_thickness], corner_radius - 1);

        // Front display recess cut (extend slightly through front face)
        translate([screen_bezel, -screen_inset_depth - 0.1, screen_bezel])
            cube([display_open_w, screen_inset_depth + 0.2, display_open_h]);
    }

    // Front bezel lip in same color as body for a more realistic frame appearance
    color([0.68, 0.70, 0.74])
    translate([0, -0.35, 0])
        difference() {
            cube([screen_frame_w, 0.35, screen_frame_h]);
            translate([screen_bezel, -0.05, screen_bezel])
                cube([display_open_w, 0.45, display_open_h]);
        }

    // Display cavity background (dark gray so bezel edge remains readable)
    color([0.08, 0.09, 0.10])
    translate([screen_bezel, -0.95, screen_bezel])
        cube([display_open_w, 0.85, display_open_h]);

    // Main visible screen surface (black, slightly proud for reliable preview visibility)
    color([0.01, 0.01, 0.01])
    translate([screen_bezel + 2, -0.10, screen_bezel + 2])
        cube([display_open_w - 4, 0.10, display_open_h - 4]);

    // Small soft reflection strip so "black screen" still reads in flat lighting
    color([0.18, 0.18, 0.19])
    translate([screen_bezel + 10, -0.09, screen_frame_h - screen_bezel - 16])
        cube([display_open_w * 0.45, 0.03, 4]);

    // Simple webcam bump
    color([0.08, 0.09, 0.11])
    translate([screen_frame_w / 2, -0.25, screen_frame_h - screen_bezel / 2])
        rotate([90, 0, 0])
            cylinder(r = 1.2, h = 0.8);
}

module laptop_screen_assembly() {
    // Place local screen so bottom-back edge sits near hinge axis, then rotate open.
    translate([screen_pivot_x, screen_pivot_y - hinge_gap, screen_pivot_z])
        rotate([-screen_tilt_back_deg, 0, 0])
            translate([-screen_frame_w / 2, 0, 0])
                screen_panel();
}

// Main Geometry
laptop_base();
keyboard_grid();
trackpad_outline();
hinge_bar();
laptop_screen_assembly();
